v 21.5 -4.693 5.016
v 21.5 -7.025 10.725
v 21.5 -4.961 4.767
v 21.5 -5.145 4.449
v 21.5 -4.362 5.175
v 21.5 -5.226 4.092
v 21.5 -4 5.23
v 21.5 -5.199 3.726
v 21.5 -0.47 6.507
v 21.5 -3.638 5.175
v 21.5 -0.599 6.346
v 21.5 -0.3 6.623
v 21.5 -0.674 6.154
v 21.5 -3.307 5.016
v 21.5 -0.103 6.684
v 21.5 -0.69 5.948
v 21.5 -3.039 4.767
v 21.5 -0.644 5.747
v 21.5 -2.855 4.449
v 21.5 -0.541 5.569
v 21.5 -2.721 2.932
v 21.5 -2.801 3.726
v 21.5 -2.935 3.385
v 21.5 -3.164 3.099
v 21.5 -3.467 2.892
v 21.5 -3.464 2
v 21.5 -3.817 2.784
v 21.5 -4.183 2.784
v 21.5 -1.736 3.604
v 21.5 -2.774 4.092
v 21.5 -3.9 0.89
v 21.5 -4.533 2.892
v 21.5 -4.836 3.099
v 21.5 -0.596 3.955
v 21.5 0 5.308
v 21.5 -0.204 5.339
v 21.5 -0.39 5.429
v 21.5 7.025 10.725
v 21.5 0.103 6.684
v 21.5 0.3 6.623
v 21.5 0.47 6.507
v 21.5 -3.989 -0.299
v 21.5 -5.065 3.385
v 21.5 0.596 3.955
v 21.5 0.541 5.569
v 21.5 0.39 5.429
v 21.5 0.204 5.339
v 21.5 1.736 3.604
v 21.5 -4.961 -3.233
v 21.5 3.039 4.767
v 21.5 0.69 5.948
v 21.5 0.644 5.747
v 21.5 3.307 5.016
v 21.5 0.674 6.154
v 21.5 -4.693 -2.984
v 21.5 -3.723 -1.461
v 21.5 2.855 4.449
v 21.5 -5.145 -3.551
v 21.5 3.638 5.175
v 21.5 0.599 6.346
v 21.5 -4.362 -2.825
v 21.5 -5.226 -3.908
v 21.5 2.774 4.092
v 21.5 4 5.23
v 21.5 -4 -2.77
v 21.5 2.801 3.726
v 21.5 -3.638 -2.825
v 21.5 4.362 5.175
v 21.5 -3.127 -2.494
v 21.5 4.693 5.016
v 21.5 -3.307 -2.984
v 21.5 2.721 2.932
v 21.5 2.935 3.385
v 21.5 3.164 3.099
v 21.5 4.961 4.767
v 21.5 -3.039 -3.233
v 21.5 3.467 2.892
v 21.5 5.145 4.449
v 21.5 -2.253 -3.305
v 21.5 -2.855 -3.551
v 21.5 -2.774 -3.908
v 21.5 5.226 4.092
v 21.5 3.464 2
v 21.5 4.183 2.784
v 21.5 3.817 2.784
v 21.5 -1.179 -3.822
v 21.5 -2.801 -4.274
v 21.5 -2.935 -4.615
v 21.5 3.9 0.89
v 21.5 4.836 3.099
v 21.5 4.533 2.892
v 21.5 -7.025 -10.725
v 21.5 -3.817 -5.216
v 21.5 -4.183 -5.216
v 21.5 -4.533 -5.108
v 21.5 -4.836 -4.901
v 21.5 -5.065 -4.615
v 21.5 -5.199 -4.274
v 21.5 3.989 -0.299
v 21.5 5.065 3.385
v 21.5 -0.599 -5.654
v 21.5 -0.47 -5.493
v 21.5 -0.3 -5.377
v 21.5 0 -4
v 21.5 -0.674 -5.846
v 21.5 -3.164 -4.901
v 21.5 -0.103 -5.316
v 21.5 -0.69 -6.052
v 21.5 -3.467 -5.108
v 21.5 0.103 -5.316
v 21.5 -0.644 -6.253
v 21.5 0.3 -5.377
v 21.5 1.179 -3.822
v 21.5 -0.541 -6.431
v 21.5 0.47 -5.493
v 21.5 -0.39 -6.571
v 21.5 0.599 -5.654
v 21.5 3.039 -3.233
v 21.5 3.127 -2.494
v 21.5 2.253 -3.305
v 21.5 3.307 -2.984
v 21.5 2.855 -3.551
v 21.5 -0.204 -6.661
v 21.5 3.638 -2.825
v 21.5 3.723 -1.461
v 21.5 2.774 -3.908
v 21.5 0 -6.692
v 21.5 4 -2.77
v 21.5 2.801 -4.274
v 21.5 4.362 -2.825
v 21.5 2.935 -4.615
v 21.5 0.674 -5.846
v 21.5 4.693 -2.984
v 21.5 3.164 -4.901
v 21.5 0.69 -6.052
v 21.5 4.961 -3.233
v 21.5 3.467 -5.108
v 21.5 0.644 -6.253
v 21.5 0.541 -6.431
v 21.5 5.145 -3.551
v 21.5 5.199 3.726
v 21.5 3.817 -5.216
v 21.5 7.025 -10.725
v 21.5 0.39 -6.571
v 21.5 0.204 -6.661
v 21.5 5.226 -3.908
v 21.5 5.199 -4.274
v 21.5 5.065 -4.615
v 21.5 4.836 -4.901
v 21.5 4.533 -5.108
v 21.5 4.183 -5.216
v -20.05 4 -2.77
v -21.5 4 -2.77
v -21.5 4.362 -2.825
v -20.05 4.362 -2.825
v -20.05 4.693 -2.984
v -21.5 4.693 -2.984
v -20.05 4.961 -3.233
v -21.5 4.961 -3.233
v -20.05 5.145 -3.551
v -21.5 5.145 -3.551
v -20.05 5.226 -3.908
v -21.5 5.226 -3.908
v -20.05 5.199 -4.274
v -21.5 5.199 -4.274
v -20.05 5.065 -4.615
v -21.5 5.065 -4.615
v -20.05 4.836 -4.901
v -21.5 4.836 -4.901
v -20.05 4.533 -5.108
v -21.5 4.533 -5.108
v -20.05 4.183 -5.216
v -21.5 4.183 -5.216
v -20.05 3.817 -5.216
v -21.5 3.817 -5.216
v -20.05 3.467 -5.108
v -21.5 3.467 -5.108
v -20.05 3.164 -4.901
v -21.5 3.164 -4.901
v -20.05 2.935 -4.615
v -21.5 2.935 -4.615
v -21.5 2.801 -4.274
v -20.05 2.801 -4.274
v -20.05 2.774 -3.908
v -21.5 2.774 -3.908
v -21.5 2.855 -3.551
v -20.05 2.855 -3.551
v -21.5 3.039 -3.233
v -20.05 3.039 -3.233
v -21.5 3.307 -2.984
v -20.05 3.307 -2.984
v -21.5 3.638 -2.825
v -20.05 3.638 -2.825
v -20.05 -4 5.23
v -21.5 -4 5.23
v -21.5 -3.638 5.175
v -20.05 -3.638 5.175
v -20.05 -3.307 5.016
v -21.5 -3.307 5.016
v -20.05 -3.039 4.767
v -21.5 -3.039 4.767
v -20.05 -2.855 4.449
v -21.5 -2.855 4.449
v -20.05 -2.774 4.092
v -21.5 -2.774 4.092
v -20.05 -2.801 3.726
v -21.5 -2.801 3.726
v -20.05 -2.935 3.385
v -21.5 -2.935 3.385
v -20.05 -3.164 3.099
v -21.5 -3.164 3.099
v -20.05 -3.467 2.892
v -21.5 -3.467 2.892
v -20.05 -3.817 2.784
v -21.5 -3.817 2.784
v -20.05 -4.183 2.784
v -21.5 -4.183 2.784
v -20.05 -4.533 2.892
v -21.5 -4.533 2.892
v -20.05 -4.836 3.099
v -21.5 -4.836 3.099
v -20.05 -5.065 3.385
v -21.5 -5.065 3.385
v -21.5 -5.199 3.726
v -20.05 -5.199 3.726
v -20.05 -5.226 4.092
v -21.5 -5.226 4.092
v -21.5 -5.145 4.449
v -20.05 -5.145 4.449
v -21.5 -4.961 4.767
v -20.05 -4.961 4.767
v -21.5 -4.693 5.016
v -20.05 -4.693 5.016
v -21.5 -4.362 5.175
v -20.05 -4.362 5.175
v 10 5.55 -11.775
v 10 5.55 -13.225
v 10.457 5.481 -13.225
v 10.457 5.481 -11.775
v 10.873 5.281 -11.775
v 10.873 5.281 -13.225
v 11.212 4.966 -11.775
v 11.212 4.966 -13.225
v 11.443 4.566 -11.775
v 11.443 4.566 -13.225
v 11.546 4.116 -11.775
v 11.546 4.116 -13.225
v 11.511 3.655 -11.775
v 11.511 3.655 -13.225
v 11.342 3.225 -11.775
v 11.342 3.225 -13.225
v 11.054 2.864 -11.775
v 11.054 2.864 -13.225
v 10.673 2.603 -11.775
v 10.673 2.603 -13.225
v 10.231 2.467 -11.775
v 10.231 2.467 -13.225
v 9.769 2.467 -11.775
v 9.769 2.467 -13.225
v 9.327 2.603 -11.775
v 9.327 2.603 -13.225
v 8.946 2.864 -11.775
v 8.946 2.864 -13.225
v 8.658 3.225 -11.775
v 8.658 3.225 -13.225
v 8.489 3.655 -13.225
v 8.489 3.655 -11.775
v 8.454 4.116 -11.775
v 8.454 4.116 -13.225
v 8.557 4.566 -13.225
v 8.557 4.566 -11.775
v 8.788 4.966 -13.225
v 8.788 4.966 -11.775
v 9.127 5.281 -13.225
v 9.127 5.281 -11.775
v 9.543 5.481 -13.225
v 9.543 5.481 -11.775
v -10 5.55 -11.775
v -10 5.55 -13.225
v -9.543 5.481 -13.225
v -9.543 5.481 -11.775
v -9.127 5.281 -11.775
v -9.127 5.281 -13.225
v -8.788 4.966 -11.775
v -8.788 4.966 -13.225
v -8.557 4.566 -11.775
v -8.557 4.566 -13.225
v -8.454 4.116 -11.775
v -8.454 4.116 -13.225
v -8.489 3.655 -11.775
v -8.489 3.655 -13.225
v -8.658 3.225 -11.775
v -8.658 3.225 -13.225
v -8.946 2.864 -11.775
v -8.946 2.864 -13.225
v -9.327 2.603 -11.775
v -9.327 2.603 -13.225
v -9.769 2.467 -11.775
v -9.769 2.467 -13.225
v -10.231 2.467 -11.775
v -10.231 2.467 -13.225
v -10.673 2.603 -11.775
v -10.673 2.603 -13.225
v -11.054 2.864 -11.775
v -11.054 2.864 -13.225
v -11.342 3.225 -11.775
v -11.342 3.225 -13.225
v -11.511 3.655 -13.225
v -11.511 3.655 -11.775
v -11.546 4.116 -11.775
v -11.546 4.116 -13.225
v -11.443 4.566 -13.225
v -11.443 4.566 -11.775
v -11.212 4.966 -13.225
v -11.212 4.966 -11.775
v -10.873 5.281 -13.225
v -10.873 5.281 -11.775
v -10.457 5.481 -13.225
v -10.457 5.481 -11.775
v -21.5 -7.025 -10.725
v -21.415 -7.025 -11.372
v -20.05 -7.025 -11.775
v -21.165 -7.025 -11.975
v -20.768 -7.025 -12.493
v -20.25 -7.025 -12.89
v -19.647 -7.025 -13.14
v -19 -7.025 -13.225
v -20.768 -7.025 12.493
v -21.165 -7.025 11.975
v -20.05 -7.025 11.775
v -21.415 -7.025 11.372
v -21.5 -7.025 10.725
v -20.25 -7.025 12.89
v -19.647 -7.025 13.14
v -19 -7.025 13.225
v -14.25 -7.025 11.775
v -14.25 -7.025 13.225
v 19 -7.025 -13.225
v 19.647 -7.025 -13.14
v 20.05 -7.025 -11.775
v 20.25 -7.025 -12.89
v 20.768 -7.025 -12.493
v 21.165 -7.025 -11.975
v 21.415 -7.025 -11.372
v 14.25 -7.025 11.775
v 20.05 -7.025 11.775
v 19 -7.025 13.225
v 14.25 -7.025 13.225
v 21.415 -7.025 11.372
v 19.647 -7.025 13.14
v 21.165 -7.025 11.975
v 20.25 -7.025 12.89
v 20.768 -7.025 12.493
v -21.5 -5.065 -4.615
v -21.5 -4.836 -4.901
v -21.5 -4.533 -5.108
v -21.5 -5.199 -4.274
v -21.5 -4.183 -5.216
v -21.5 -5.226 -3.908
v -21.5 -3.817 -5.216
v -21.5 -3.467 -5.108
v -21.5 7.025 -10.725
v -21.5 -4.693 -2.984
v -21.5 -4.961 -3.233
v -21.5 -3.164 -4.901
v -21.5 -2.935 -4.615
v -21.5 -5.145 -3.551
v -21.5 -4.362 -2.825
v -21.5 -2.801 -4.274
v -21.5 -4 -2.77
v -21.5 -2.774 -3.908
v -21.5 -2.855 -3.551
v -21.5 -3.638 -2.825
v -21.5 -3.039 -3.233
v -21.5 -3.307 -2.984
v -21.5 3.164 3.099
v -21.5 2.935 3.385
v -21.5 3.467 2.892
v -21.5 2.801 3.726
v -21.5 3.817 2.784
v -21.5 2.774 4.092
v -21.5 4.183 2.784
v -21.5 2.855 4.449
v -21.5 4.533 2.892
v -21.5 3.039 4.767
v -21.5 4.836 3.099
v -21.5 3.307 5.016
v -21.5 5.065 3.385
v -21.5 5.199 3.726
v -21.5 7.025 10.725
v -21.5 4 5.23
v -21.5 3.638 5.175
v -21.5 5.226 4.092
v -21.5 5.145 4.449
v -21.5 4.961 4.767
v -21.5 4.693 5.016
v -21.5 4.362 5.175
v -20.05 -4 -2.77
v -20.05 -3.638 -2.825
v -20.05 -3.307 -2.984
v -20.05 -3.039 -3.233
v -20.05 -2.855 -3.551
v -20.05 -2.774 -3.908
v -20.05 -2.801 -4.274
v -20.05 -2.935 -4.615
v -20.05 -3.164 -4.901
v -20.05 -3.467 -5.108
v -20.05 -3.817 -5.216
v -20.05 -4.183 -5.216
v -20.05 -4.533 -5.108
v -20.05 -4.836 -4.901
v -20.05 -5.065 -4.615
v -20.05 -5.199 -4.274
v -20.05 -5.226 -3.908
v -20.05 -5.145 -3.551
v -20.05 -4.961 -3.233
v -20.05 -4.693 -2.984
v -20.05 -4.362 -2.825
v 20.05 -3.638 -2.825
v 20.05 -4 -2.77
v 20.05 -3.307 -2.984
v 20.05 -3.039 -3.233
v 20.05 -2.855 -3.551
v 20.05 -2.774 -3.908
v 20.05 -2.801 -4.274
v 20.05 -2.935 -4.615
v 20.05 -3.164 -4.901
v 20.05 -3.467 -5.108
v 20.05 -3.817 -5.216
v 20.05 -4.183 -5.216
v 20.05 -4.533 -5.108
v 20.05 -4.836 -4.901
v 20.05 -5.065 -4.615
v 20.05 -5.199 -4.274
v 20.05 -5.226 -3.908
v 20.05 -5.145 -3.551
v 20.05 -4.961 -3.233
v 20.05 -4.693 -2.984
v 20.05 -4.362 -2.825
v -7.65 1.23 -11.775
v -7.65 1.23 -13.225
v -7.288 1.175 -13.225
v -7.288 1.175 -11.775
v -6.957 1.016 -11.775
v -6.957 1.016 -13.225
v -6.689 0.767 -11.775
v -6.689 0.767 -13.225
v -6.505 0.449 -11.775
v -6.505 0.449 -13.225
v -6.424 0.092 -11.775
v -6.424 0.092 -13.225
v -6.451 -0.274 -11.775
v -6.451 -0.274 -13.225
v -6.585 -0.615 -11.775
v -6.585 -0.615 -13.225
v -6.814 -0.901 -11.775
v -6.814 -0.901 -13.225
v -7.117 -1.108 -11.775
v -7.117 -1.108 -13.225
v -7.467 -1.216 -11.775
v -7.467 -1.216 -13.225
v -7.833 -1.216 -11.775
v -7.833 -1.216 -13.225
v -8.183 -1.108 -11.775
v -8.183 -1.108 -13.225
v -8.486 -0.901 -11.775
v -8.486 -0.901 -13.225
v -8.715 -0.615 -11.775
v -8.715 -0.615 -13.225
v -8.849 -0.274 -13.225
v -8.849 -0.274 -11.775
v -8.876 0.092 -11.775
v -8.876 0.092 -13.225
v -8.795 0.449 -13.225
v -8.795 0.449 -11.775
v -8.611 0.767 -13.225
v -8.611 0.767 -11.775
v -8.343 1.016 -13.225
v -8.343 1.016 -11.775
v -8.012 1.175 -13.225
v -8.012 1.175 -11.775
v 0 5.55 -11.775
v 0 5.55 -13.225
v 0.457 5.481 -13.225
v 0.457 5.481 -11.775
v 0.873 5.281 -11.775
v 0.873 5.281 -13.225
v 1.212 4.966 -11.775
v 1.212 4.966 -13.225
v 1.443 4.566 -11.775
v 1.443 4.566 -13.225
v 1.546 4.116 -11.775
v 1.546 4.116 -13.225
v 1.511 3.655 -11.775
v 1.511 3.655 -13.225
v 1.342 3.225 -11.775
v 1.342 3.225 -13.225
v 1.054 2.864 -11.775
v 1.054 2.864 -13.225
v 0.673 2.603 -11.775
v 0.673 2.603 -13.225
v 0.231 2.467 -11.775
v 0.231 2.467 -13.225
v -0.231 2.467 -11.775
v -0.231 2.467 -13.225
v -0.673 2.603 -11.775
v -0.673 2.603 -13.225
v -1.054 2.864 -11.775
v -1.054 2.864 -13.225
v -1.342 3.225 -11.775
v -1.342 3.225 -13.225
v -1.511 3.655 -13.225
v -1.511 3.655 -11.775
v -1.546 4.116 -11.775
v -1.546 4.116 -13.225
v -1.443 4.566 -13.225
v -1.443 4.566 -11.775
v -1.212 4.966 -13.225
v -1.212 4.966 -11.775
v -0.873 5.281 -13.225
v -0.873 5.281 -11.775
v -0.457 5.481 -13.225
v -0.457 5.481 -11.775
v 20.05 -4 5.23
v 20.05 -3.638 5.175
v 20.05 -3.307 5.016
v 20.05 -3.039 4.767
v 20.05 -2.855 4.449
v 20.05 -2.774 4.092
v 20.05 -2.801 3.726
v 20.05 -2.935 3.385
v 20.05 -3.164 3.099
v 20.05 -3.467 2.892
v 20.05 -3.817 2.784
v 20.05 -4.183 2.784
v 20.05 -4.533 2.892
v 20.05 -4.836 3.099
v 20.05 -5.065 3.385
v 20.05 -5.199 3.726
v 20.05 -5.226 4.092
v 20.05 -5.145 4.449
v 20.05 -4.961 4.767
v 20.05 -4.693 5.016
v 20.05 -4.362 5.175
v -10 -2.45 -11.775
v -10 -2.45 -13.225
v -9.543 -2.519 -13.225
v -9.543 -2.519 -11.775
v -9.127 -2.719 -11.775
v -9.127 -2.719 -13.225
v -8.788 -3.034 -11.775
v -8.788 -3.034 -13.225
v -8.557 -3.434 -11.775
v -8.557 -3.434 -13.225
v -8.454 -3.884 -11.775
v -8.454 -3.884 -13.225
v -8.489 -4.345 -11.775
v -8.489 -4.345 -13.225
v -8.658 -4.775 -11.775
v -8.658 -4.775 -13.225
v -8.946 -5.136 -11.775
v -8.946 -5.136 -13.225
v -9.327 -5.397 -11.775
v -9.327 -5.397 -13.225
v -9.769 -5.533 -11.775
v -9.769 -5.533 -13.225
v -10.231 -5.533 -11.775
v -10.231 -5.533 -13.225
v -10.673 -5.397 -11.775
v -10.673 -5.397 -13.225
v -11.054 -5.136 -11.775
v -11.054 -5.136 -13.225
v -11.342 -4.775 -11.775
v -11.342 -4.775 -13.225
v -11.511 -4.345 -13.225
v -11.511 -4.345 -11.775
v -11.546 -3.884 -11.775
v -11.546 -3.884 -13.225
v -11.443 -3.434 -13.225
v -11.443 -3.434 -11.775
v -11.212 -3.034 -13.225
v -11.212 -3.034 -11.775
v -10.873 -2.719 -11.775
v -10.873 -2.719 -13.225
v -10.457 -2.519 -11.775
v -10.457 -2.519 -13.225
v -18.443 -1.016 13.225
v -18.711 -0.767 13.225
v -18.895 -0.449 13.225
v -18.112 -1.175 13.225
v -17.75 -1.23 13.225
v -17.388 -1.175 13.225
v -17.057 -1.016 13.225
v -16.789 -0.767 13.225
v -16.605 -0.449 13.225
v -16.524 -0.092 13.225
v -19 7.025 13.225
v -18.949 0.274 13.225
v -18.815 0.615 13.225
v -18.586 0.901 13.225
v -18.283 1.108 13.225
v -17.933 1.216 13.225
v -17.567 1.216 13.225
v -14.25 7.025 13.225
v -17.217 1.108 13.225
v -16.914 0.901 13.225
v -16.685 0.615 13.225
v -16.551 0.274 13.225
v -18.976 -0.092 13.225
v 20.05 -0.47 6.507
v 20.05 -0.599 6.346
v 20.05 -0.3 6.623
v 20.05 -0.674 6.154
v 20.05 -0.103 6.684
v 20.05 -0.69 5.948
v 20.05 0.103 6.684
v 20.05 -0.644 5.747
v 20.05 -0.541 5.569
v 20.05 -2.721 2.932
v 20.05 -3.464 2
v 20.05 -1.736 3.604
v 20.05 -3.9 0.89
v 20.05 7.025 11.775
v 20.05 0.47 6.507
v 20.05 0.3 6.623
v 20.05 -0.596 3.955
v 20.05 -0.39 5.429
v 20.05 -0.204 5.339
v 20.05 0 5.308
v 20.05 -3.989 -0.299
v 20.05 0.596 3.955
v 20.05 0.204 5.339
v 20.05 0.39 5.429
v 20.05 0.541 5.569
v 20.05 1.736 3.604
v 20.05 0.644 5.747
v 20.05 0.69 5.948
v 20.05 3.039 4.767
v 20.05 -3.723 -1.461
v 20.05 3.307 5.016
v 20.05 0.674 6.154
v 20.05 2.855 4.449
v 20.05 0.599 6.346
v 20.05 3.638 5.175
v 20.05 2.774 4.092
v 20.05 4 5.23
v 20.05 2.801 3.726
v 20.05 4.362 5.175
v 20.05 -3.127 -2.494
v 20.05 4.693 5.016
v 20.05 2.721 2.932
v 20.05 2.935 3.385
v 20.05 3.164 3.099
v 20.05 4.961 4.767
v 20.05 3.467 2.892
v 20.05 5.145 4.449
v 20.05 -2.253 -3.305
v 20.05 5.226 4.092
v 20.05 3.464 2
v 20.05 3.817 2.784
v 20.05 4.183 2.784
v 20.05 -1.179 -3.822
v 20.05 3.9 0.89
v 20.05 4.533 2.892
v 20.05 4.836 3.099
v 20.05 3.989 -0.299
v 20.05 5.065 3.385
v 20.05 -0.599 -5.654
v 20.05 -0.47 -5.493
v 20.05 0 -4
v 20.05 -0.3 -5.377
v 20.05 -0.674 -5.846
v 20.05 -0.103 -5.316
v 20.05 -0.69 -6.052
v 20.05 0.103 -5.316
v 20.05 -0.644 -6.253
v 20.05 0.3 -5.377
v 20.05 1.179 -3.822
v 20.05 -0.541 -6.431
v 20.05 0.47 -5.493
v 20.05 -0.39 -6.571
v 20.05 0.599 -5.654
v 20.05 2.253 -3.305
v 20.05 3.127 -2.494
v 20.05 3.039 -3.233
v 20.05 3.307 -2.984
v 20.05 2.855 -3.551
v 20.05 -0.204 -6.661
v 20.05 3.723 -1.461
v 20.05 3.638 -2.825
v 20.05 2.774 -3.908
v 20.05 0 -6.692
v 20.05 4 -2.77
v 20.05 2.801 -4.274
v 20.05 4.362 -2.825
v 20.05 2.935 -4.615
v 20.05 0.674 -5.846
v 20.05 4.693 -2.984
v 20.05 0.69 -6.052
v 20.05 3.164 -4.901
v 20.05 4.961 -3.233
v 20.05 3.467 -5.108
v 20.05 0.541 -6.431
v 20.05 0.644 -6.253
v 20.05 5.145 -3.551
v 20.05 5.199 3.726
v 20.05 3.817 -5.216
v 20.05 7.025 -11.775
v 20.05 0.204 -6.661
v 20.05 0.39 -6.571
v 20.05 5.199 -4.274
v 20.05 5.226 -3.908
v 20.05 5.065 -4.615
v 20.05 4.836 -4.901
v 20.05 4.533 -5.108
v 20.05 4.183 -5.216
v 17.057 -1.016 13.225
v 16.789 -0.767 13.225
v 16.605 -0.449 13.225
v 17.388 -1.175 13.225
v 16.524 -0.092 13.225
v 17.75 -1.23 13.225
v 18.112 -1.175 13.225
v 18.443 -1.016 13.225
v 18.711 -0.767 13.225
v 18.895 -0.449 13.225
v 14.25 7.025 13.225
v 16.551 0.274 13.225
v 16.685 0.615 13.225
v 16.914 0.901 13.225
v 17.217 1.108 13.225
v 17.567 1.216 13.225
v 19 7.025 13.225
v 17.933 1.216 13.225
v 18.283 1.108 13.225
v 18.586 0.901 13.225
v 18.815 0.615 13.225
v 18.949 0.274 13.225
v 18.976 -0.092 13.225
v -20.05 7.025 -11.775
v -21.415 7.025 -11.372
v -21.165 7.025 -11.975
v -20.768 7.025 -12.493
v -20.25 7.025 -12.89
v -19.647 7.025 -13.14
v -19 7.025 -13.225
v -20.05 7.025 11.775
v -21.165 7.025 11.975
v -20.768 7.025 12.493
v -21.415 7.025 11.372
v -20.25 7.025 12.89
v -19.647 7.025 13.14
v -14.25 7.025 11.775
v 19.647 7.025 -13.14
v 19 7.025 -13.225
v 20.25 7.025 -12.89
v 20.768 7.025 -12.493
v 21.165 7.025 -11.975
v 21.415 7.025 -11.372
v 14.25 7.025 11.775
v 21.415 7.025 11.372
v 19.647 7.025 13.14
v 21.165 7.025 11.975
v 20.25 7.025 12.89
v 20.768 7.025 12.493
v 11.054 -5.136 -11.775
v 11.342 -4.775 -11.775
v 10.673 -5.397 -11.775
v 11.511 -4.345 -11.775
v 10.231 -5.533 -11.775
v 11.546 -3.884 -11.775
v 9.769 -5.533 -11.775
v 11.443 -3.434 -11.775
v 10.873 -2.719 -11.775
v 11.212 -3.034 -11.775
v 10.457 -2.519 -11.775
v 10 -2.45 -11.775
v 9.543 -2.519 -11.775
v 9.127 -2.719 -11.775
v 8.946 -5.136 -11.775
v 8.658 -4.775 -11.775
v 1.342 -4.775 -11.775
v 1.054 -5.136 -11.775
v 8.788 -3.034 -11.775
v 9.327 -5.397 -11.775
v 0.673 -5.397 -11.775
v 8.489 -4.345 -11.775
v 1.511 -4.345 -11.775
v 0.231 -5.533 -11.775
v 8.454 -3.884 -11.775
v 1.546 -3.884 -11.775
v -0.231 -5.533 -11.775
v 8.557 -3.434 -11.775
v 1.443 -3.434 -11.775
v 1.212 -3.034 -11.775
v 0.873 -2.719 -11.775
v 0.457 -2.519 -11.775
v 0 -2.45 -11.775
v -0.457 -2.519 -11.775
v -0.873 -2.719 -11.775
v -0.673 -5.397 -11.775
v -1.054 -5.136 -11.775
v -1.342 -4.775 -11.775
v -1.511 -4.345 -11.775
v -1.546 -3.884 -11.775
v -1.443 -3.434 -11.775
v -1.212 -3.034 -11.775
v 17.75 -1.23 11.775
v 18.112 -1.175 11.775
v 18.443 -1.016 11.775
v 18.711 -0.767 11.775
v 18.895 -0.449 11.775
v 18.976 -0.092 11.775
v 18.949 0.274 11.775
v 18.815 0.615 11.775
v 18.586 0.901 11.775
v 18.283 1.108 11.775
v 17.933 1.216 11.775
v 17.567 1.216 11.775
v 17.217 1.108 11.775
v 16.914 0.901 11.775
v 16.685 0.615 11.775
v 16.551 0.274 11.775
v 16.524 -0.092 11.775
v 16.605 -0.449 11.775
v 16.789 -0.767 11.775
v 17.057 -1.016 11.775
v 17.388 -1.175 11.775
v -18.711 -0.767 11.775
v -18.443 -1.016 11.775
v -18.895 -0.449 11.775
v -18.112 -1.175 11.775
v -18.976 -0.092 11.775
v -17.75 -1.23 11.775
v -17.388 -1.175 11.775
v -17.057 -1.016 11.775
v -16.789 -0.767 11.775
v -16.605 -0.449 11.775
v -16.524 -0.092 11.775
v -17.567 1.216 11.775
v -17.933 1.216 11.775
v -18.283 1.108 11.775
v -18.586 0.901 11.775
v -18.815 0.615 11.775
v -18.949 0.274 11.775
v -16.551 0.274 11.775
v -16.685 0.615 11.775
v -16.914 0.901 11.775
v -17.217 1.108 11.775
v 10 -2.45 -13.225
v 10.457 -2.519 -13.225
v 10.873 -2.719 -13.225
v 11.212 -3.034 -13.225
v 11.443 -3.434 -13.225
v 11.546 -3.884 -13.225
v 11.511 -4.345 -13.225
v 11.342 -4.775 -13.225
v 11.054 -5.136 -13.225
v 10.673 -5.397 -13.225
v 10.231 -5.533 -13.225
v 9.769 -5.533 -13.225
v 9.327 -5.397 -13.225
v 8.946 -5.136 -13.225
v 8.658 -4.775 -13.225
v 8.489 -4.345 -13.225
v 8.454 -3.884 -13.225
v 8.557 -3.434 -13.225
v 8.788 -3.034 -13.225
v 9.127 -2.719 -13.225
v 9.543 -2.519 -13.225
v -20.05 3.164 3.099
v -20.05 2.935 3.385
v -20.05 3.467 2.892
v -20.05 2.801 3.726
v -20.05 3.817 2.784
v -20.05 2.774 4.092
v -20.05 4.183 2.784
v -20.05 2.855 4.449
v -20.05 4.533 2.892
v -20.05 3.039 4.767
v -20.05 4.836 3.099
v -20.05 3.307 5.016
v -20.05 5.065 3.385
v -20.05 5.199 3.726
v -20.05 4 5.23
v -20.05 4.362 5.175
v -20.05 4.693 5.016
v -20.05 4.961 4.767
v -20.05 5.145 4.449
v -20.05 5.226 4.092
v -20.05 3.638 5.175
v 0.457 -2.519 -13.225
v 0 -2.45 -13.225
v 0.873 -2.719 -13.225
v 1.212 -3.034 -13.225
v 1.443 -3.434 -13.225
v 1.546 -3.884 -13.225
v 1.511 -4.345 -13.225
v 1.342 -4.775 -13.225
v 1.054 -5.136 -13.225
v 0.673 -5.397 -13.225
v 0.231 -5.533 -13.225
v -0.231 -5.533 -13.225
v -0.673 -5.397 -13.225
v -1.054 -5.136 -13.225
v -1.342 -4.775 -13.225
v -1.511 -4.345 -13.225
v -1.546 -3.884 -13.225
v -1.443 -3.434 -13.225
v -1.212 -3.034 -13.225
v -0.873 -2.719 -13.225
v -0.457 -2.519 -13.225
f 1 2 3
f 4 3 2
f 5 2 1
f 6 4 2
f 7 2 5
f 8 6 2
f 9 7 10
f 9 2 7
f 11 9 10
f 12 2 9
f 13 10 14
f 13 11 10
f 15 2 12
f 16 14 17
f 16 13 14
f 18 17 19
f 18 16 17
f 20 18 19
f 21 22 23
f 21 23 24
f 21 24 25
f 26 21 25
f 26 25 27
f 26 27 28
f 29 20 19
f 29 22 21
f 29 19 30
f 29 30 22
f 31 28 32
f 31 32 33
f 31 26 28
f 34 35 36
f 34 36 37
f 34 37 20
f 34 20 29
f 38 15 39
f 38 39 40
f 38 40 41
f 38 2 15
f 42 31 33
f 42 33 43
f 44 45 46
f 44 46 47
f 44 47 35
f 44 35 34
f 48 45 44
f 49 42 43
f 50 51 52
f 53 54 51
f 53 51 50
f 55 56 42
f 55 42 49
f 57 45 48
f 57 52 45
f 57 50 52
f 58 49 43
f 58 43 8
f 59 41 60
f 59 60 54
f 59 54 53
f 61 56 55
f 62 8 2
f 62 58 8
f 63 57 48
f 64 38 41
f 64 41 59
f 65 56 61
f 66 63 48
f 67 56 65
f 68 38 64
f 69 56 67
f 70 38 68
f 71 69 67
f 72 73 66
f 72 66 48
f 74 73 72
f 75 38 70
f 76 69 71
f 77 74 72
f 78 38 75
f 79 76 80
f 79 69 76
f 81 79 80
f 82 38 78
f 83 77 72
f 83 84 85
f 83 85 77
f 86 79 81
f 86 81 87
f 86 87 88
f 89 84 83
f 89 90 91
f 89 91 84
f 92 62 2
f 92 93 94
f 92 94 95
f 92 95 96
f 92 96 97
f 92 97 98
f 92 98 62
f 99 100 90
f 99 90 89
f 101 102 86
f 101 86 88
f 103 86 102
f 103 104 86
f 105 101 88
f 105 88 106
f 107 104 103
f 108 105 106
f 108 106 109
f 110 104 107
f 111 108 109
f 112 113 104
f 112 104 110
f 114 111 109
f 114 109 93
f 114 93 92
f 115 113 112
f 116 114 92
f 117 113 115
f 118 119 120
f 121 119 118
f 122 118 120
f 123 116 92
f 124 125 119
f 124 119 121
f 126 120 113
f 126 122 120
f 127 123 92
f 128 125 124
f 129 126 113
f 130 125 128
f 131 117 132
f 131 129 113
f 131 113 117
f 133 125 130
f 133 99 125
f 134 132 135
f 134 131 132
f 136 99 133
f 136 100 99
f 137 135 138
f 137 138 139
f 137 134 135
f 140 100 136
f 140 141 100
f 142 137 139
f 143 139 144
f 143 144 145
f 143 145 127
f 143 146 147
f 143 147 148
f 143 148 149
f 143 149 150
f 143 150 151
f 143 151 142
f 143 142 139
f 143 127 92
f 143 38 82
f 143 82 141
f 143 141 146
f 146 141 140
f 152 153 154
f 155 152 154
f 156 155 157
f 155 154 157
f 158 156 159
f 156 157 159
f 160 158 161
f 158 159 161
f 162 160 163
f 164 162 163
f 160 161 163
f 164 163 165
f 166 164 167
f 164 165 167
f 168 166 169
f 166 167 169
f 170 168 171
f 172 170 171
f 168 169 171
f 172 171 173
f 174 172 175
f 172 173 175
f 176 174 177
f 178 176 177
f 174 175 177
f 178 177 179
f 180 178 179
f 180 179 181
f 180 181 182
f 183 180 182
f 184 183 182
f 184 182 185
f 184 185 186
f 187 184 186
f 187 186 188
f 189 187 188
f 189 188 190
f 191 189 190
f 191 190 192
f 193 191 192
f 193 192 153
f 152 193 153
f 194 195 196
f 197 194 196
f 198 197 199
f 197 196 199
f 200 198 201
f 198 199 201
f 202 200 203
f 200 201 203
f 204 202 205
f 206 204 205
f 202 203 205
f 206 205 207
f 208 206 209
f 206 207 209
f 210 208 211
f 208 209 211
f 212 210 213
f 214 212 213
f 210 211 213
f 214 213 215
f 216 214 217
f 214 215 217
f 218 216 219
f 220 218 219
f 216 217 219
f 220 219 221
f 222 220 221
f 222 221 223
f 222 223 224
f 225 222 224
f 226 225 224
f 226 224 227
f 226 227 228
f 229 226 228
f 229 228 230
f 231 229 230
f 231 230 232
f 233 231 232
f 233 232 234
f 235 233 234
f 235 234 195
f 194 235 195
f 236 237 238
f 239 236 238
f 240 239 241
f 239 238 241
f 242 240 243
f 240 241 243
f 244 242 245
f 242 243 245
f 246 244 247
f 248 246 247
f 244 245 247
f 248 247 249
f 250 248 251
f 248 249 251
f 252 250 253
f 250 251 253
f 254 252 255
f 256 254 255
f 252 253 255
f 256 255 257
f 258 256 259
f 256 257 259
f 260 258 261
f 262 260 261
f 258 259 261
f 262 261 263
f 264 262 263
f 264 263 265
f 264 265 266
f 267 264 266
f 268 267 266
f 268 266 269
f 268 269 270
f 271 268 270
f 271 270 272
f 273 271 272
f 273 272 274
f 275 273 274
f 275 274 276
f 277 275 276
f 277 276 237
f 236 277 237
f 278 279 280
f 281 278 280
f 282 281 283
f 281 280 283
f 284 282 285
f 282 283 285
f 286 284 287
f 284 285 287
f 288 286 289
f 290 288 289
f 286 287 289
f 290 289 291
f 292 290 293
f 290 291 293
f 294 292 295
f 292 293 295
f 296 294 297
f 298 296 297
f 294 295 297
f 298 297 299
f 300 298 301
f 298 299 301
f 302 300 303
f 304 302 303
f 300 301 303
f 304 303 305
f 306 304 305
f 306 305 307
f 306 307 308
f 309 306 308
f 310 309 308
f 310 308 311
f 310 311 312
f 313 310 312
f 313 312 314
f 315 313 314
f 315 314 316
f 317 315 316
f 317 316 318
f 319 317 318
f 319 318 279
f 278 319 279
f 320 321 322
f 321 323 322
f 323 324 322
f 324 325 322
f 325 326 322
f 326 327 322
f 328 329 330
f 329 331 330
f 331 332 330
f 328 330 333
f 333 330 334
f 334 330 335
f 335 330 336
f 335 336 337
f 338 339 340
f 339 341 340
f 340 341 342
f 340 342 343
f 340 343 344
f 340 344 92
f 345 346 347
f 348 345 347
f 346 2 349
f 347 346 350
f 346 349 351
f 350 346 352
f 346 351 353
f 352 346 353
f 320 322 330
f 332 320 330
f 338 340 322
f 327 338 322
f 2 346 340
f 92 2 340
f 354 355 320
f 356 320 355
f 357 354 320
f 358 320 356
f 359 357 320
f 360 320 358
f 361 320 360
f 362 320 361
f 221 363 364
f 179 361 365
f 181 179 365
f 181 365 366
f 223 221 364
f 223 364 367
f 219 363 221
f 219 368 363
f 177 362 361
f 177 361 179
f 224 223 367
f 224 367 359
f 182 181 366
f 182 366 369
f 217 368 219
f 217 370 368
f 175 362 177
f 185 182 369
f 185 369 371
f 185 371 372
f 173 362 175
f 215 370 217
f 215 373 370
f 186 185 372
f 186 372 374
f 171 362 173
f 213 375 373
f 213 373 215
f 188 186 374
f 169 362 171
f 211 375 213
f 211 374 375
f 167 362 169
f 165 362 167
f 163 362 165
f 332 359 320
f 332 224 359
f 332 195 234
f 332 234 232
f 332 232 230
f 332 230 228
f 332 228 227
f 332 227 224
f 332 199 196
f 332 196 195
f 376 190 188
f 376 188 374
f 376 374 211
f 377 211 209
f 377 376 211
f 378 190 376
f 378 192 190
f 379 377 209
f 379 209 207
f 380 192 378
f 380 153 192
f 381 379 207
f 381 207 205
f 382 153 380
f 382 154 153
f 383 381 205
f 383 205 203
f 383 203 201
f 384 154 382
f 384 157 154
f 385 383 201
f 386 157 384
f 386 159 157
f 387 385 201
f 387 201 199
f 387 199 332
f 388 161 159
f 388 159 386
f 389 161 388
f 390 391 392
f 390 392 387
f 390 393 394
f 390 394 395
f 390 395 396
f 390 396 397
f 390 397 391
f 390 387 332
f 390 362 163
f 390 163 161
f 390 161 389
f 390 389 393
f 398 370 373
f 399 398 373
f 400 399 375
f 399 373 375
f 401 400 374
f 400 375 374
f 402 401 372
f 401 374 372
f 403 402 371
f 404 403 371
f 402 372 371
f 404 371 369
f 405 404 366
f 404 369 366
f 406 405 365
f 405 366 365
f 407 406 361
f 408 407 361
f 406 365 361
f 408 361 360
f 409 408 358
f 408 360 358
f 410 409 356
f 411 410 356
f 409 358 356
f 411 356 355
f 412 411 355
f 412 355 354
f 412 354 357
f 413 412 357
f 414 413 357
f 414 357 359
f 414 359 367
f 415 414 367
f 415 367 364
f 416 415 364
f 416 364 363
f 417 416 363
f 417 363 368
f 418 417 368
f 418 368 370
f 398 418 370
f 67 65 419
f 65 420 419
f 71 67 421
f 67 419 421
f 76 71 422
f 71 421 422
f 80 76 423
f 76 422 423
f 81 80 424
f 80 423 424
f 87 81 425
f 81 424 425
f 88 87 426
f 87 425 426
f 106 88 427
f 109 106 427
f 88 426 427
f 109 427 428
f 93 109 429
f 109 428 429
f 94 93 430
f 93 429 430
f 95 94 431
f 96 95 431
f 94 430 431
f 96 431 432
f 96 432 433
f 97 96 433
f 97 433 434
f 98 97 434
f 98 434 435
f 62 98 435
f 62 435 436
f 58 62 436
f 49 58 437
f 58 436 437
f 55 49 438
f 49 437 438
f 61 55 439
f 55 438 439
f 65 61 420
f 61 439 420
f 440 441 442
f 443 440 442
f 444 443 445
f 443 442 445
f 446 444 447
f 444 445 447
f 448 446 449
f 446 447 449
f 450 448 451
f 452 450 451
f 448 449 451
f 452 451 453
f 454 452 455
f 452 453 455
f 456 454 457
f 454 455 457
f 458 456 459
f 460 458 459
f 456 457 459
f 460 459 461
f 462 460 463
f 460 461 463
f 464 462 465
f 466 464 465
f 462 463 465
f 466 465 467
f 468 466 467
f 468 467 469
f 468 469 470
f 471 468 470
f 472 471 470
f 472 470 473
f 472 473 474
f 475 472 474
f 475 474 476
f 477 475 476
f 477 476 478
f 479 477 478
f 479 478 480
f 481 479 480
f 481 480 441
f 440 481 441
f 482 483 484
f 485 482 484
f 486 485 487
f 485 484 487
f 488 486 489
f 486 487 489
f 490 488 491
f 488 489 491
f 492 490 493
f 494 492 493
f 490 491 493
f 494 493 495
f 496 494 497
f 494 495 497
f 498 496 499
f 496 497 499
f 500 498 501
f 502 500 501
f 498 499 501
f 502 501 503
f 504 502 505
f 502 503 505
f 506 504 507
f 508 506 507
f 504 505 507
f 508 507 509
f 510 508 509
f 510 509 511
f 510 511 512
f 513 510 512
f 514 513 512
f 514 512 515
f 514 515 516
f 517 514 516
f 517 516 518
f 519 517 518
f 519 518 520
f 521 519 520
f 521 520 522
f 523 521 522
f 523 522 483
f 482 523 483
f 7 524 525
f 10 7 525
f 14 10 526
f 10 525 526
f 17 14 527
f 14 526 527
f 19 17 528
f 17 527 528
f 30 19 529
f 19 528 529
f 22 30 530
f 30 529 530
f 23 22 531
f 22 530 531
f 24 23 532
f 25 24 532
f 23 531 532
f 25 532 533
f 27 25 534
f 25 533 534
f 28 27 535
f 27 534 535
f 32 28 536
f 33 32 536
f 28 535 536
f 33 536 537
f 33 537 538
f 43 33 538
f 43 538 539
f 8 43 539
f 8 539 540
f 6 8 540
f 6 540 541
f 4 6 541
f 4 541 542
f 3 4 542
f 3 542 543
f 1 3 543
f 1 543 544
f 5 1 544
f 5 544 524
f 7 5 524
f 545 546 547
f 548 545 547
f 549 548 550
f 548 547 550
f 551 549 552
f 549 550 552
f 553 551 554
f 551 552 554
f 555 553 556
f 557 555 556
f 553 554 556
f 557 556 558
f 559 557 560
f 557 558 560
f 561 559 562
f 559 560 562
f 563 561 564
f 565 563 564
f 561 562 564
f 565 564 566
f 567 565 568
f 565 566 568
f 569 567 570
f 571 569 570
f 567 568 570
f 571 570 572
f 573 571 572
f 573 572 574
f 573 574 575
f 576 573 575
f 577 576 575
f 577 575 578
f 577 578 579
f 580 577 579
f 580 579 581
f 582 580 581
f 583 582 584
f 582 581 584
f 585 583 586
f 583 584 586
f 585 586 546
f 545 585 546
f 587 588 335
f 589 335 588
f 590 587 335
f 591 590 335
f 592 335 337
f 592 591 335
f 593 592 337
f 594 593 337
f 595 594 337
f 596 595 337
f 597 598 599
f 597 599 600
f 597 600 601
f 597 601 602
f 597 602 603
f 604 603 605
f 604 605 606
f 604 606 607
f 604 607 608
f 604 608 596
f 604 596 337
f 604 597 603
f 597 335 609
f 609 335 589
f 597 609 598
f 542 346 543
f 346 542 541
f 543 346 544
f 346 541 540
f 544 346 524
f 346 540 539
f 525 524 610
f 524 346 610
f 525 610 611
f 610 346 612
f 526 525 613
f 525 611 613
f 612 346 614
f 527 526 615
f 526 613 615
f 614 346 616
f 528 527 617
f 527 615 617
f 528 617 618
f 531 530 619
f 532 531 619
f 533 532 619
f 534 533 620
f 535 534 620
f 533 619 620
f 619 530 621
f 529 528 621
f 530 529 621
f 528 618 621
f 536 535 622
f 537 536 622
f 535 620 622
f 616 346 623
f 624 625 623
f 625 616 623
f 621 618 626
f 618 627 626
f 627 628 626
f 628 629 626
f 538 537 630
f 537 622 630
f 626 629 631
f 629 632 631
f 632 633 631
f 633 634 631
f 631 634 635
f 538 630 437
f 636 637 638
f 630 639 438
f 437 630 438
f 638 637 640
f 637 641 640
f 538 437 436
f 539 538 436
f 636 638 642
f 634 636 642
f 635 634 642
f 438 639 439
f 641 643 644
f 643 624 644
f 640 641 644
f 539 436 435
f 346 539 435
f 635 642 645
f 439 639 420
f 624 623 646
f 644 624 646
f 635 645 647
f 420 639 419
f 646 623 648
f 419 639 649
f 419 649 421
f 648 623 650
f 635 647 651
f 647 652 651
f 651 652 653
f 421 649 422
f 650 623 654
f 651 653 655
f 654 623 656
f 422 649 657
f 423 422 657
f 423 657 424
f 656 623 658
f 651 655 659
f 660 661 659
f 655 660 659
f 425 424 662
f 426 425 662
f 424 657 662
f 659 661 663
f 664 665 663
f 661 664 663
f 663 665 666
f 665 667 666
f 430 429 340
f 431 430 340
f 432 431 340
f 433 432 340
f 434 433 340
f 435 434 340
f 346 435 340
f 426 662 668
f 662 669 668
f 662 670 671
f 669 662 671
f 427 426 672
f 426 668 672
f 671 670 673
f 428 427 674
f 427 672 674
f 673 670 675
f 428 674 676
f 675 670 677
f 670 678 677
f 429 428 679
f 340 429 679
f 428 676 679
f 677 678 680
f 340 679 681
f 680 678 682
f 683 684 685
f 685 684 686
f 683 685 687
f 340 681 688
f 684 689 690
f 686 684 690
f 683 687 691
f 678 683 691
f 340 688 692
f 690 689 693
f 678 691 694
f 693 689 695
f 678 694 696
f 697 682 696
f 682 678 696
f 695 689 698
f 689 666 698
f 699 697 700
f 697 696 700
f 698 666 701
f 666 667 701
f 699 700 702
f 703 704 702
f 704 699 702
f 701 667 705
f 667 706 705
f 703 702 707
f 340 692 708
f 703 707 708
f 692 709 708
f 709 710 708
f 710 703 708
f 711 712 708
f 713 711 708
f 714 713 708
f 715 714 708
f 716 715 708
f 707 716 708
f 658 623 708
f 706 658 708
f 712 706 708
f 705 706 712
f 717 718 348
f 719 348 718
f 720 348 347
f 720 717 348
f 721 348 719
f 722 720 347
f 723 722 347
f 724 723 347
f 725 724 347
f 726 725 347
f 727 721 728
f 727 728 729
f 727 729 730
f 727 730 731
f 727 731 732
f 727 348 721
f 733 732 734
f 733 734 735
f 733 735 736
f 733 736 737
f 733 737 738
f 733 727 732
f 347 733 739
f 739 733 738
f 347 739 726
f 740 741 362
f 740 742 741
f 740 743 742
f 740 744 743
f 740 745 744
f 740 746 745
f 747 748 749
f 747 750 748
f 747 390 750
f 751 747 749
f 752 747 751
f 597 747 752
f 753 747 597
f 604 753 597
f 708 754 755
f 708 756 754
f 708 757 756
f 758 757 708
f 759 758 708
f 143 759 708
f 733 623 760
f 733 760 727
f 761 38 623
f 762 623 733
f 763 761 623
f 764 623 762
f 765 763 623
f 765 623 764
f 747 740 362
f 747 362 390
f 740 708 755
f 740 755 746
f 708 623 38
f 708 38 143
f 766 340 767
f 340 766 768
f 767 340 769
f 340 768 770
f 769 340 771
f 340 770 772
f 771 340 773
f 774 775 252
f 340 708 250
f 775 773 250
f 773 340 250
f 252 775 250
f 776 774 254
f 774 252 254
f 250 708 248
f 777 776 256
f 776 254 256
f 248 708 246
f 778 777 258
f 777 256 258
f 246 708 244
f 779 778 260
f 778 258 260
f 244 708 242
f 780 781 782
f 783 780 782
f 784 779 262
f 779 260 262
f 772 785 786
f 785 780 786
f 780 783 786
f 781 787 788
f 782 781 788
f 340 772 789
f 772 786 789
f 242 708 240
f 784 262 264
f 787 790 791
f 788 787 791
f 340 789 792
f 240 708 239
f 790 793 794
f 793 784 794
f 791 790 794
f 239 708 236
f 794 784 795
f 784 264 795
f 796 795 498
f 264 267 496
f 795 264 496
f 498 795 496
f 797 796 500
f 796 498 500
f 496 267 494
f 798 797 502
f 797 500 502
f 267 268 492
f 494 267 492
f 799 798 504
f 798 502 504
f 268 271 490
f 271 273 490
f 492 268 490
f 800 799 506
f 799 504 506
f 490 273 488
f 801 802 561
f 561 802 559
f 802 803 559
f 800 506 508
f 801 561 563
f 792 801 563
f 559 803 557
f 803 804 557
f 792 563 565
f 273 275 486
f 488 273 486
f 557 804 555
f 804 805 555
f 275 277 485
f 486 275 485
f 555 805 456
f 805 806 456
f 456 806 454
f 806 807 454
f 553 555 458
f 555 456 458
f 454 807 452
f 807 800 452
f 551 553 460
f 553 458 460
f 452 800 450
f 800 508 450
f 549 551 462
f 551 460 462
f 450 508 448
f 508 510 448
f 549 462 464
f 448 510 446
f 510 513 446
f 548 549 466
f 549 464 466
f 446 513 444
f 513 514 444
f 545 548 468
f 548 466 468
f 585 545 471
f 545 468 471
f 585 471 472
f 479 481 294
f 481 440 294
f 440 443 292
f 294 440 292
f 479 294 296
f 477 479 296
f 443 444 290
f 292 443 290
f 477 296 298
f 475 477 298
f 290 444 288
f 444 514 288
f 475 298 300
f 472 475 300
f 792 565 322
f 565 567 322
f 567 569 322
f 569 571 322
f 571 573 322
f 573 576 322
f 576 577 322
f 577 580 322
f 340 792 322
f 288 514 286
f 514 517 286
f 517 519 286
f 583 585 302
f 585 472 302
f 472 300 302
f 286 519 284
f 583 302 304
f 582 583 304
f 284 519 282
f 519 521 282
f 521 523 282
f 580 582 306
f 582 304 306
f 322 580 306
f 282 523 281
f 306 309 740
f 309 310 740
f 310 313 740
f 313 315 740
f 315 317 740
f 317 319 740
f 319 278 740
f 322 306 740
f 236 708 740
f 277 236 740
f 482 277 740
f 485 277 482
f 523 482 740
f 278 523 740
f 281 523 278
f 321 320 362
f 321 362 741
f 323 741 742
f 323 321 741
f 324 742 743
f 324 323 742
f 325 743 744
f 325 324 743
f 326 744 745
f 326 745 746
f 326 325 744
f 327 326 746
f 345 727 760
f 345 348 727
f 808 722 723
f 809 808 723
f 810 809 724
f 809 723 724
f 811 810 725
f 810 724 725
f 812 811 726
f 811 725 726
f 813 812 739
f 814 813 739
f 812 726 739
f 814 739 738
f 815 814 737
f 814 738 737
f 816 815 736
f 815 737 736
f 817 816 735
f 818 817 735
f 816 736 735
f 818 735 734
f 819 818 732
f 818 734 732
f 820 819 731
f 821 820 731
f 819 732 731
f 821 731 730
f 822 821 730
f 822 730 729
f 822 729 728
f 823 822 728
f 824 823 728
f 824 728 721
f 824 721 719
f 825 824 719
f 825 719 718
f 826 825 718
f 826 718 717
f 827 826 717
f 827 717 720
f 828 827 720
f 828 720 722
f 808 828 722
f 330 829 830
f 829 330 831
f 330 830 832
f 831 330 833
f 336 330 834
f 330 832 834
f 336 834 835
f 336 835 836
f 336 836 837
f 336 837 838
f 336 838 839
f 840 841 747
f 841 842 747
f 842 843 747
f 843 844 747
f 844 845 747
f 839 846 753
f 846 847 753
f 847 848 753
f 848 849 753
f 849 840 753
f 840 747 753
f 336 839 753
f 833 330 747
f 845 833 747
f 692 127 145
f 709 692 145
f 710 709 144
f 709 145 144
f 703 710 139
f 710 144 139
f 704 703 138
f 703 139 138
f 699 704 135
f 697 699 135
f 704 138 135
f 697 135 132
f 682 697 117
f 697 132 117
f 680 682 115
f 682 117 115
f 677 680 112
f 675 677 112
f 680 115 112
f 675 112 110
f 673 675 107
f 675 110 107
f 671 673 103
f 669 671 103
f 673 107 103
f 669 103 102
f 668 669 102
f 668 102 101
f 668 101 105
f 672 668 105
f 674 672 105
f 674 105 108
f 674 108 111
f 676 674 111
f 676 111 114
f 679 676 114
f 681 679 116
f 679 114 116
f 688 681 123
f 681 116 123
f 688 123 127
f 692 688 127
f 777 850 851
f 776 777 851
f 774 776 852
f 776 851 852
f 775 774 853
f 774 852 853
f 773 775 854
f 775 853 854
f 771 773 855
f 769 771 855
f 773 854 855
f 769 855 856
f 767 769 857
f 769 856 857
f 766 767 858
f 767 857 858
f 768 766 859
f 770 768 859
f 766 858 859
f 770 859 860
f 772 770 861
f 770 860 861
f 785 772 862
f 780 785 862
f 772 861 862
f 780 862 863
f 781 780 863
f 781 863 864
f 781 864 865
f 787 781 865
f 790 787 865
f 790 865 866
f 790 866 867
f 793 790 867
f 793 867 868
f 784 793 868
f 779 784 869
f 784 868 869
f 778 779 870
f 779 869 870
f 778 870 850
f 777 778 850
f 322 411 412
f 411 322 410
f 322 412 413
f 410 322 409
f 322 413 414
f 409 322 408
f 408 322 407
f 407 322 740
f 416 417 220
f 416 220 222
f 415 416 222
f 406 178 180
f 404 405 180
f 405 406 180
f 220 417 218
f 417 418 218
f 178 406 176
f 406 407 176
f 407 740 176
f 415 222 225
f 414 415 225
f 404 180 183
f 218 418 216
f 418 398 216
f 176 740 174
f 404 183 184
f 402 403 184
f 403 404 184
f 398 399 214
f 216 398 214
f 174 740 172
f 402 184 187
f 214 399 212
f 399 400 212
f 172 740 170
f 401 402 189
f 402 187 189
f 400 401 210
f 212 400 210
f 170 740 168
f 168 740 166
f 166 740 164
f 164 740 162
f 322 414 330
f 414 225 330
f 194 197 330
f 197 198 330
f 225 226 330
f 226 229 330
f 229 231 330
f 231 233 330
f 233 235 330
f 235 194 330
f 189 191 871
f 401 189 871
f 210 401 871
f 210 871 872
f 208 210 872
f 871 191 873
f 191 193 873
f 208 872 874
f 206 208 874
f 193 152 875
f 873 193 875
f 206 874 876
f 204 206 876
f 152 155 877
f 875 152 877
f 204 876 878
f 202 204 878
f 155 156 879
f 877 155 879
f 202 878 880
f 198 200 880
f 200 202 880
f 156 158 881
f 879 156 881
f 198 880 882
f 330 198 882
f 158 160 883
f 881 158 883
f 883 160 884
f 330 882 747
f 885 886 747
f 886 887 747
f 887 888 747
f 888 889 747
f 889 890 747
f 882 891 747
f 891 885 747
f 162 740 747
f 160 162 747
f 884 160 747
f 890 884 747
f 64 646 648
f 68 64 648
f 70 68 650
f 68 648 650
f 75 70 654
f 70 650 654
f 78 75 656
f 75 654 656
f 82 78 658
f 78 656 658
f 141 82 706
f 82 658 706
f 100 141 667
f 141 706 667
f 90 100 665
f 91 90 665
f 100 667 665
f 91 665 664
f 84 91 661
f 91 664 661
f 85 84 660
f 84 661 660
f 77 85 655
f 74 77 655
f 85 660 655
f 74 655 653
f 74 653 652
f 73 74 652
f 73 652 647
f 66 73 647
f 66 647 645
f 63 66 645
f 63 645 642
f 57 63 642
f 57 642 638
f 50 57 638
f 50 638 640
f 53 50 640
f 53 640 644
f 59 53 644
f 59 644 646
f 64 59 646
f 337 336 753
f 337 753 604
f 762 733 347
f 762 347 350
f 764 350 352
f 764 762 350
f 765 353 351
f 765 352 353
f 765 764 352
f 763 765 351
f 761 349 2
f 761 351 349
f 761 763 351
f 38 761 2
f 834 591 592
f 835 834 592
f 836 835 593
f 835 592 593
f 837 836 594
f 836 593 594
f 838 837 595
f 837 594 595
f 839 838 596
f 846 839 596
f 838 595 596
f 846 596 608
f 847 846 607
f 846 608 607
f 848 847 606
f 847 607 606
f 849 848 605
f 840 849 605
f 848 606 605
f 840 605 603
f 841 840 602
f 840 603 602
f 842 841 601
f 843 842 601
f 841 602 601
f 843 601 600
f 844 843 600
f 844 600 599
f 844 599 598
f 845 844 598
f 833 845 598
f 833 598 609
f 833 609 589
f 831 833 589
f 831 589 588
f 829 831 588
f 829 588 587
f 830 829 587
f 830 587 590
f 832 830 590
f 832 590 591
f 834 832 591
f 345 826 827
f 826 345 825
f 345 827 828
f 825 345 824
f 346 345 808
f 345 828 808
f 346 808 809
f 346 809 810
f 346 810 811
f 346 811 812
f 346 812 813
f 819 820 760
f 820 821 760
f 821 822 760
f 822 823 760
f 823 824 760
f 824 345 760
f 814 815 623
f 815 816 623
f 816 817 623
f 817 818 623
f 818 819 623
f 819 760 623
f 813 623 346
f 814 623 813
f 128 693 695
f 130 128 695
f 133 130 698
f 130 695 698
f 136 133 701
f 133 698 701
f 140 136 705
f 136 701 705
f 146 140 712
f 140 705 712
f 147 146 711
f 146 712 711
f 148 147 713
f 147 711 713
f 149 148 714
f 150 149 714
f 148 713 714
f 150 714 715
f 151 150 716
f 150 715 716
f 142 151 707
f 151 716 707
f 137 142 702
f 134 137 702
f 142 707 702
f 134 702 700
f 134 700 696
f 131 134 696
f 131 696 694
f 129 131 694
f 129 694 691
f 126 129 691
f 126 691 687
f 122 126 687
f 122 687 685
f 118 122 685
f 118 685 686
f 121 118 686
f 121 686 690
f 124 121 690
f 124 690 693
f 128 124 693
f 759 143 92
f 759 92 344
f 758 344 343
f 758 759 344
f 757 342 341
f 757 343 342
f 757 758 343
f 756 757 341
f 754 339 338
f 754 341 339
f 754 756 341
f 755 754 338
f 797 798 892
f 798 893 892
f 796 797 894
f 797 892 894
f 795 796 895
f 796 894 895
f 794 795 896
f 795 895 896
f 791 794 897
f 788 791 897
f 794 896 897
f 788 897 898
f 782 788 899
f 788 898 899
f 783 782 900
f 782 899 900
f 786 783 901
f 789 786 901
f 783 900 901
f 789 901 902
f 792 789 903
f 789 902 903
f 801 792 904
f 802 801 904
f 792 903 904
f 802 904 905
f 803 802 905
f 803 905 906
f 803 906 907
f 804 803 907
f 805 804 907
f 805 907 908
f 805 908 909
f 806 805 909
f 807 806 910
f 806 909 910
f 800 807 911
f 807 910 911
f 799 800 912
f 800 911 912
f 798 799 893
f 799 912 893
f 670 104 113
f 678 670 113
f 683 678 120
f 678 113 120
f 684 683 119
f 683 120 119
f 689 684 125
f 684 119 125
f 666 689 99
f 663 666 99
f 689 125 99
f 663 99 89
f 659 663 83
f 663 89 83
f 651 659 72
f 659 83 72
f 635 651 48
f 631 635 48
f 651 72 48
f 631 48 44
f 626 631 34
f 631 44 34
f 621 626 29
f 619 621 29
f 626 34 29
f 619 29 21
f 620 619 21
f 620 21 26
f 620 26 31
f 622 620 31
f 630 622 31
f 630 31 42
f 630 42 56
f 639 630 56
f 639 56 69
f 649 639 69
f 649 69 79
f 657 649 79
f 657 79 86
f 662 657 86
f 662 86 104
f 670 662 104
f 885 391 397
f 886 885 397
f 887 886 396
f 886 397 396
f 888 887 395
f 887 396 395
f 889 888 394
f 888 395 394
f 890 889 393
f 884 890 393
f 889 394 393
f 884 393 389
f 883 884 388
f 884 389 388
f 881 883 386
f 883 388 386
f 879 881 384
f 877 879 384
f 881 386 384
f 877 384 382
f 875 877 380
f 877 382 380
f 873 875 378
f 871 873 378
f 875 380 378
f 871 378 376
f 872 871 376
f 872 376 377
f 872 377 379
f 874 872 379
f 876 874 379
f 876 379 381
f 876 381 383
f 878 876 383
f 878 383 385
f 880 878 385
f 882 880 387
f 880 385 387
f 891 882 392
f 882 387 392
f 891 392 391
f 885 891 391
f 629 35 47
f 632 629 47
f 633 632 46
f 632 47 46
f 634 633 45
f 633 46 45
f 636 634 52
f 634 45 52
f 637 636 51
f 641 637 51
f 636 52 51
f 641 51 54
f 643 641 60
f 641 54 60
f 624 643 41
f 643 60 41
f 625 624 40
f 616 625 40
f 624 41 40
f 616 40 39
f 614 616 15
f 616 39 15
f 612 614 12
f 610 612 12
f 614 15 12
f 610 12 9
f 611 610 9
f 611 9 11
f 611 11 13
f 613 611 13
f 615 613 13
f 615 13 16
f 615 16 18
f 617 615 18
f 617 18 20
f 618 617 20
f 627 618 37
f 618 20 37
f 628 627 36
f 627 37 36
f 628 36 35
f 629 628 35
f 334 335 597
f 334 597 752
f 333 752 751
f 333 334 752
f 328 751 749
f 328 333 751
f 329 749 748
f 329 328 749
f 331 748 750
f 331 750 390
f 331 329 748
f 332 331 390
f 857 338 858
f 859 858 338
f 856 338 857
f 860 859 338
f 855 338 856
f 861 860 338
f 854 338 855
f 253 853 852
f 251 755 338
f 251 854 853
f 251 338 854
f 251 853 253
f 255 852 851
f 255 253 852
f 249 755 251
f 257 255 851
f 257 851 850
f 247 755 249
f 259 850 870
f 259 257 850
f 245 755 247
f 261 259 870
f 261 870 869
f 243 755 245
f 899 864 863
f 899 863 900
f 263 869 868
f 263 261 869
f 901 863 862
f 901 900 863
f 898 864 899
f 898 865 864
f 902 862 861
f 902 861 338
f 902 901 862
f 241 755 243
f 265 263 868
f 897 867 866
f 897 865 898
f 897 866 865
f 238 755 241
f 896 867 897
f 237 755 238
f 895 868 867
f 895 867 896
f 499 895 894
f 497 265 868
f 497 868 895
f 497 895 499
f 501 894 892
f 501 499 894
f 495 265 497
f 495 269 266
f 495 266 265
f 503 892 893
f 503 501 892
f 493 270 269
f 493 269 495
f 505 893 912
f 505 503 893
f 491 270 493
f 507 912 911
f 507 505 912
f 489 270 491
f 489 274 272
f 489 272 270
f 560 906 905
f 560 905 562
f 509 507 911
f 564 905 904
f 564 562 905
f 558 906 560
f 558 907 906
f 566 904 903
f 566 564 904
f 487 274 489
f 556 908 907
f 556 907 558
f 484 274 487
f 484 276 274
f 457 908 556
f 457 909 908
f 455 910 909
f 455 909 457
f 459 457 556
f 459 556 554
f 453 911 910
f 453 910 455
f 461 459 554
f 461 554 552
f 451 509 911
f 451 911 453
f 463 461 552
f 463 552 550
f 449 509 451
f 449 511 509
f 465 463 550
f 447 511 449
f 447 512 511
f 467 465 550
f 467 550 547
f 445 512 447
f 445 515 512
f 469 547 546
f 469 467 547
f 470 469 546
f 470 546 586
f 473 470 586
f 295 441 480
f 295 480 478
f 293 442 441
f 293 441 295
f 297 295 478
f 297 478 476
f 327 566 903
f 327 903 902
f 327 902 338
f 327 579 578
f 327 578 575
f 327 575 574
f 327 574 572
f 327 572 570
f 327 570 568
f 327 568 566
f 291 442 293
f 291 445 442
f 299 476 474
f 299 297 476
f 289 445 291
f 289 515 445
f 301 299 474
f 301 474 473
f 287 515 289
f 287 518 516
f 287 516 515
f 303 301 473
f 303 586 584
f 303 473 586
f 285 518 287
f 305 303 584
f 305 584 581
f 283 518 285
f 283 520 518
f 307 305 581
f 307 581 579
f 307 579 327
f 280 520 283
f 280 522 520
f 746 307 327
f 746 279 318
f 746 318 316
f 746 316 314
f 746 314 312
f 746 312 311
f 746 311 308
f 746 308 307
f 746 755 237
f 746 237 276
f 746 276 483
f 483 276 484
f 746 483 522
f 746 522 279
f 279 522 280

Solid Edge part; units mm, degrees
sketch "Sketch1" plane through (0, 0, 0) normal (0, -1, 0) x (1, 0, 0)
  line L0 (-21.5, 13.225) -> (21.5, 13.225)
  line L1 (21.5, 13.225) -> (21.5, -13.225)
  line L2 (21.5, -13.225) -> (-21.5, -13.225)
  line L3 (-21.5, -13.225) -> (-21.5, 13.225)
  line L4 (-20.05, 11.775) -> (20.05, 11.775)
  line L5 (20.05, 11.775) -> (20.05, -11.775)
  line L6 (20.05, -11.775) -> (-20.05, -11.775)
  line L7 (-20.05, -11.775) -> (-20.05, 11.775)
  dimension "D1" = 43
  dimension "D2" = 26.45
  dimension "D3" = 1.45
extrude "Protrusion1" add sketch "Sketch1" along normal mid plane 14.05
sketch "Sketch2" plane through (0, -7.025, 0) normal (0, -1, 0) x (1, 0, 0)
  line L0 (-14.25, 13.225) -> (14.25, 13.225)
  line L1 (14.25, 13.225) -> (14.25, 11.775)
  line L2 (14.25, 11.775) -> (-14.25, 11.775)
  line L3 (-14.25, 11.775) -> (-14.25, 13.225)
  dimension "D1" = 7.25
  dimension "D2" = 7.25
extrude "Cutout1" cut sketch "Sketch2" against normal up to next
hole "Hole_1" at (-17.75, 0, 13.225) direction (0, 0, -1) diameter 2.459 end up to next
hole "Hole1" at (17.75, 0, 13.225) direction (0, 0, -1) diameter 2.459 end up to next
hole "Hole_3" at (10, -4, -13.225) direction (0, 0, 1) diameter 3.1 end up to next
hole "Hole2" at (10, 4, -13.225) direction (0, 0, 1) diameter 3.1 end up to next
hole "Hole3" at (0, 4, -13.225) direction (0, 0, 1) diameter 3.1 end up to next
hole "Hole4" at (0, -4, -13.225) direction (0, 0, 1) diameter 3.1 end up to next
hole "Hole5" at (-10, -4, -13.225) direction (0, 0, 1) diameter 3.1 end up to next
hole "Hole6" at (-10, 4, -13.225) direction (0, 0, 1) diameter 3.1 end up to next
hole "Hole_9" at (-21.5, 4, 4) direction (1, 0, 0) diameter 2.459 end through all
hole "Hole7" at (-21.5, -4, 4) direction (1, 0, 0) diameter 2.459 end through all
hole "Hole8" at (-21.5, -4, -4) direction (1, 0, 0) diameter 2.459 end through all
hole "Hole9" at (-21.5, 4, -4) direction (1, 0, 0) diameter 2.459 end through all
fillet "Round_1" radius 2.5 4 edges at (-21.5, 0, 13.225) (-21.5, 0, -13.225) (21.5, 0, -13.225) (21.5, 0, 13.225)
hole "Hole_13" at (21.5, 0, 0) direction (-1, 0, 0) diameter 8 end up to next
hole "Hole_14" at (21.5, 0, 6) direction (-1, 0, 0) diameter 1.383 end up to next
hole "Hole10" at (21.5, 0, -6) direction (-1, 0, 0) diameter 1.383 end up to next
hole "Hole_16" at (-7.65, 0, -13.225) direction (0, 0, 1) diameter 2.459 end up to next
